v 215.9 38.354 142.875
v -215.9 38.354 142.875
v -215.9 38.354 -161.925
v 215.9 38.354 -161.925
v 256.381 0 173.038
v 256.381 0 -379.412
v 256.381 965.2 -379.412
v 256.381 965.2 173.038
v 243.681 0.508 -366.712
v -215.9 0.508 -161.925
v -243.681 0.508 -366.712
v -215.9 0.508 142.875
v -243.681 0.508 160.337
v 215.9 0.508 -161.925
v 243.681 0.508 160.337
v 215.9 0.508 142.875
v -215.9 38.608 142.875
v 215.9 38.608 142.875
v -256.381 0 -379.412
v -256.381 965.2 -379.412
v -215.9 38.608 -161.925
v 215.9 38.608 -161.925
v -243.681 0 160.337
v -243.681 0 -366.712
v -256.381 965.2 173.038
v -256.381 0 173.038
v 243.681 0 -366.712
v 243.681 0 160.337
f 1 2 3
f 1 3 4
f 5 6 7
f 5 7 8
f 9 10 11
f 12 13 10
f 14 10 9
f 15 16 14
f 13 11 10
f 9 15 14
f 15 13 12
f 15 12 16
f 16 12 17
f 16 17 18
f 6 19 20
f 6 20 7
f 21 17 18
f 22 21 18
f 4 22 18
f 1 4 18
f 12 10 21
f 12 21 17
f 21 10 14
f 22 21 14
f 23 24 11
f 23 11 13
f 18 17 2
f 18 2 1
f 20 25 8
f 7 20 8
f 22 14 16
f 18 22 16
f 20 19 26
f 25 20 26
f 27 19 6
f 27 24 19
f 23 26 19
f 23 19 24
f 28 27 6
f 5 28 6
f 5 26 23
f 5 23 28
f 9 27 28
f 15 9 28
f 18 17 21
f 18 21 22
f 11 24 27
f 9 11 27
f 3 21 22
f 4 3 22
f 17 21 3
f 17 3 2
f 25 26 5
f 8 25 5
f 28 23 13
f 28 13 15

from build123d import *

# Parameters (mm, degrees)
F0_W      = 512.7625
F0_H      = 552.45
F1_DEPTH  = 965.2
F2_W      = 487.3625
F2_H      = 527.05
F3_DEPTH  = 0.508
F4_W      = 431.8
F4_H      = 304.8
F5_DEPTH  = 38.1
F5_FACE_W = 431.8
F5_FACE_H = 304.8
F6_DEPTH  = 0.254


with BuildPart() as f1:
    # F0 (on Front) → F1 (new body)
    with BuildSketch(Plane.XZ):
        with Locations((0, -103.1875)):
            Rectangle(F0_W, F0_H)
    extrude(amount=-F1_DEPTH)

    # F2 (on face) → F3 (cut)
    with BuildSketch(Plane.XZ):
        with Locations((0, -103.1875)):
            Rectangle(F2_W, F2_H)
    extrude(amount=-F3_DEPTH, mode=Mode.SUBTRACT)

    # F4 (on face) → F5 (cut)
    with BuildSketch(Plane.XZ.offset(-0.508)):
        with Locations((0, -9.525)):
            Rectangle(F4_W, F4_H)
    extrude(amount=-F5_DEPTH, mode=Mode.SUBTRACT)


with BuildPart() as f6:
    # F5_face (on face) → F6 (new body)
    with BuildSketch(Plane(origin=(0, 38.608, -9.525), x_dir=(1, 0, 0), z_dir=(0, -1, 0))):
        Rectangle(F5_FACE_W, F5_FACE_H)
    extrude(amount=F6_DEPTH)


solid = Compound([f1.part, f6.part])
